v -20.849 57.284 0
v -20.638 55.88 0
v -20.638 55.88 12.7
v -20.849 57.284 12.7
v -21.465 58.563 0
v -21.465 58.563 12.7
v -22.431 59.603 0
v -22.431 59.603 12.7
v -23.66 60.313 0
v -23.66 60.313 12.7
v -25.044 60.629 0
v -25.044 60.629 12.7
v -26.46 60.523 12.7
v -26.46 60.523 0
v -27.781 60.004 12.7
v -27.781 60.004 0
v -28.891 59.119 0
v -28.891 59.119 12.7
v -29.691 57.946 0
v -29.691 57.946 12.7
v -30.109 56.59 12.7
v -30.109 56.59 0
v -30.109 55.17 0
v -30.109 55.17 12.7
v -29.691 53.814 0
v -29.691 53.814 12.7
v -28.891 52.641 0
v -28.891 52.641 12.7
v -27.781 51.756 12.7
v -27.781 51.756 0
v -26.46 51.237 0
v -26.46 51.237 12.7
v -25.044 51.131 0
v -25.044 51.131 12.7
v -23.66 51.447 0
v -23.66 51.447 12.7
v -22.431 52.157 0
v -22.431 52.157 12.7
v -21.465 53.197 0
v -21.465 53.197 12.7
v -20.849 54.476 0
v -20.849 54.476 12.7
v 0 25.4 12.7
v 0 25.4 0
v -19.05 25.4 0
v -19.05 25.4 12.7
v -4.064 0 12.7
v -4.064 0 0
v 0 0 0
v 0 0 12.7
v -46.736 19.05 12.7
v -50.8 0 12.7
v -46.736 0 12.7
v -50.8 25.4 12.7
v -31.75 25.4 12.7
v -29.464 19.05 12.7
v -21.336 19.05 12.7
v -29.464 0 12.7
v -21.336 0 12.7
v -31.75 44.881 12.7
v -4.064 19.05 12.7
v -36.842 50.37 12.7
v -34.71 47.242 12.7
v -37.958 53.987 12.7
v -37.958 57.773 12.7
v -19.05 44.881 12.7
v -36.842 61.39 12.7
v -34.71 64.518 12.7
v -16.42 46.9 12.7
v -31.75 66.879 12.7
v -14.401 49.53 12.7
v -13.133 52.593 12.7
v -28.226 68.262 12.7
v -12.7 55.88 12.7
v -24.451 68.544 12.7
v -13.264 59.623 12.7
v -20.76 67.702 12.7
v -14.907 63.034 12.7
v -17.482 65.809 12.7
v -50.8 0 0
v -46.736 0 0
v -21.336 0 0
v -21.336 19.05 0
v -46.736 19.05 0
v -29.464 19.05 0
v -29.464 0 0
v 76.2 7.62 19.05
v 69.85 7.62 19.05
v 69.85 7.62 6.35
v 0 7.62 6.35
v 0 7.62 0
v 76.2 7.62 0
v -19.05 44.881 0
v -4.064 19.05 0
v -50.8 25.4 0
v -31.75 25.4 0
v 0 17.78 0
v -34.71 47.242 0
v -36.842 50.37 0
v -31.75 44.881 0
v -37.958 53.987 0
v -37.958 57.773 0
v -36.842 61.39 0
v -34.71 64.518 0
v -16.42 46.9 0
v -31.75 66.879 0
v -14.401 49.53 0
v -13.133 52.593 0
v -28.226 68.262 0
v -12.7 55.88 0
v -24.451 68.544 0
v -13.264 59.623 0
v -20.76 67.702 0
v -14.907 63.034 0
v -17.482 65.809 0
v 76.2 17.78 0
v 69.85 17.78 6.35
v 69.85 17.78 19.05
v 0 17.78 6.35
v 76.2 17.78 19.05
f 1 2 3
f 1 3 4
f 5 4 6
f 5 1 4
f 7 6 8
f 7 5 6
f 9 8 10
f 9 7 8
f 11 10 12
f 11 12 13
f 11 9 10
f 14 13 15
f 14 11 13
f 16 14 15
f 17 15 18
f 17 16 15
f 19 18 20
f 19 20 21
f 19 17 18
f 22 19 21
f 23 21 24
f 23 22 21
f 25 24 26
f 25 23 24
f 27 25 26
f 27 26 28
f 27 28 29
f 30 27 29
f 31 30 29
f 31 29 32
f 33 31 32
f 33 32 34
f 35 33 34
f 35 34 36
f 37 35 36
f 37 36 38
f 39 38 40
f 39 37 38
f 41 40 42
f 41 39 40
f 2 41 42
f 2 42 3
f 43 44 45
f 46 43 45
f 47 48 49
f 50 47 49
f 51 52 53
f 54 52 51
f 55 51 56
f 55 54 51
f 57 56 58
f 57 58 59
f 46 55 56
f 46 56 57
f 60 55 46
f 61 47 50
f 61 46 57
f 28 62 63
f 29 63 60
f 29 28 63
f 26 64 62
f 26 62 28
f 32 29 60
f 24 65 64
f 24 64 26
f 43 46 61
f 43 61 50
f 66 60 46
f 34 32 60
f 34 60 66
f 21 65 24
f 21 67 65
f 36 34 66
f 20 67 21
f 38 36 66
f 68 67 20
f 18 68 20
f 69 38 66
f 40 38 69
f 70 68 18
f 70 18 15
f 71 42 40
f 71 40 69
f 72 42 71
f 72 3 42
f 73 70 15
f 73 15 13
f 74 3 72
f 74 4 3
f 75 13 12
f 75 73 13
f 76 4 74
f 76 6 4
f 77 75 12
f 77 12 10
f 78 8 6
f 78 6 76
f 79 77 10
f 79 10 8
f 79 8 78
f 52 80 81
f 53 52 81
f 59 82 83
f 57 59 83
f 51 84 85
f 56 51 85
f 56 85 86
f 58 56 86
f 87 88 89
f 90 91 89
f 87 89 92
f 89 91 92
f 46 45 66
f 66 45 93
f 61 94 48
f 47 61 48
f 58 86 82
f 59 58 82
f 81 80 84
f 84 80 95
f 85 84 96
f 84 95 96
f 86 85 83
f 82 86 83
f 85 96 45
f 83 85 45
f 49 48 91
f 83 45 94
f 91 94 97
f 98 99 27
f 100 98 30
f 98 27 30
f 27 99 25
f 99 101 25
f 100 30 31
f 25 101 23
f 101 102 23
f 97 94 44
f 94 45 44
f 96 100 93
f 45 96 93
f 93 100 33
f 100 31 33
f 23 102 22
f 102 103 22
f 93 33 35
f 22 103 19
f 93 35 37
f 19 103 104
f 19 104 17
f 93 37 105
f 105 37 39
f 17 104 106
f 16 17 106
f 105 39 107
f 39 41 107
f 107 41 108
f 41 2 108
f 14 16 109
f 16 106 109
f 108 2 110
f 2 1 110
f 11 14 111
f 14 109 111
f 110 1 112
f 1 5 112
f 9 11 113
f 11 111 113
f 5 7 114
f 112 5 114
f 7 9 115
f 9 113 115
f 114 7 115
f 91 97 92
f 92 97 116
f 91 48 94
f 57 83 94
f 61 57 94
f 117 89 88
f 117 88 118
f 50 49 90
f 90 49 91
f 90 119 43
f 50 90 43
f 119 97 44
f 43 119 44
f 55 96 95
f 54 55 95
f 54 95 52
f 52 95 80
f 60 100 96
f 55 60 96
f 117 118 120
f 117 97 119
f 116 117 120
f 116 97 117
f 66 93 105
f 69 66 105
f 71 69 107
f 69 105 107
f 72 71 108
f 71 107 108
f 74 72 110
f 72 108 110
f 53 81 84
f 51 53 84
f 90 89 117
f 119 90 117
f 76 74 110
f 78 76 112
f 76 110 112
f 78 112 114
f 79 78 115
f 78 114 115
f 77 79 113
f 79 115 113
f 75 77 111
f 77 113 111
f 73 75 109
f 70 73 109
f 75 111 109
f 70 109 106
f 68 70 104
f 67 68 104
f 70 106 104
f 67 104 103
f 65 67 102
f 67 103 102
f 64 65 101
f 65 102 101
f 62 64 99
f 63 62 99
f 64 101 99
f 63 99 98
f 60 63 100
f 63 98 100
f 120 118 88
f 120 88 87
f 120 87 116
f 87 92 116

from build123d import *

# Parameters (mm, degrees)
F0_R     = 4.7625
F1_DEPTH = 12.7
F2_W     = 10.16
F2_H     = 6.35
F3_DEPTH = 76.2
F4_W     = 6.35
F4_H     = 10.16
F5_DEPTH = 12.7


with BuildPart() as f1:
    # F0 (on Top) → F1 (new body)
    with BuildSketch(Plane.XY):
        with BuildLine():
            Line((-31.75, 44.881477), (-31.75, 25.4))
            Line((-31.75, 25.4), (-19.05, 25.4))
            Line((-19.05, 25.4), (-19.05, 44.881477))
            ThreePointArc((-19.05, 44.881477), (-25.4, 43.18), (-31.75, 44.881477))
        make_face()
        with BuildLine():
            ThreePointArc((-12.7, 55.88), (-31.75, 66.878523), (-31.75, 44.881477))
            ThreePointArc((-31.75, 44.881477), (-25.4, 43.18), (-19.05, 44.881477))
            ThreePointArc((-19.05, 44.881477), (-14.401477, 49.53), (-12.7, 55.88))
        make_face()
        with Locations((-25.4, 55.88)):
            Circle(F0_R, mode=Mode.SUBTRACT)
        Polygon((-50.8, 25.4), (-50.8, 0), (-46.736, 0), (-46.736, 19.05), (-29.464, 19.05), (-29.464, 0), (-21.336, 0), (-21.336, 19.05), (-4.064, 19.05), (-4.064, 0), (0, 0), (0, 25.4), (-19.05, 25.4), (-31.75, 25.4), align=None)
    extrude(amount=F1_DEPTH)

    # F2 (on face) → F3 (join)
    with BuildSketch(Plane.YZ):
        with Locations((12.7, 3.175)):
            Rectangle(F2_W, F2_H)
    extrude(amount=F3_DEPTH)

    # F4 (on face) → F5 (join)
    with BuildSketch(Plane.XY.offset(6.35)):
        with Locations((73.025, 12.7)):
            Rectangle(F4_W, F4_H)
    extrude(amount=F5_DEPTH)


solid = f1.part
